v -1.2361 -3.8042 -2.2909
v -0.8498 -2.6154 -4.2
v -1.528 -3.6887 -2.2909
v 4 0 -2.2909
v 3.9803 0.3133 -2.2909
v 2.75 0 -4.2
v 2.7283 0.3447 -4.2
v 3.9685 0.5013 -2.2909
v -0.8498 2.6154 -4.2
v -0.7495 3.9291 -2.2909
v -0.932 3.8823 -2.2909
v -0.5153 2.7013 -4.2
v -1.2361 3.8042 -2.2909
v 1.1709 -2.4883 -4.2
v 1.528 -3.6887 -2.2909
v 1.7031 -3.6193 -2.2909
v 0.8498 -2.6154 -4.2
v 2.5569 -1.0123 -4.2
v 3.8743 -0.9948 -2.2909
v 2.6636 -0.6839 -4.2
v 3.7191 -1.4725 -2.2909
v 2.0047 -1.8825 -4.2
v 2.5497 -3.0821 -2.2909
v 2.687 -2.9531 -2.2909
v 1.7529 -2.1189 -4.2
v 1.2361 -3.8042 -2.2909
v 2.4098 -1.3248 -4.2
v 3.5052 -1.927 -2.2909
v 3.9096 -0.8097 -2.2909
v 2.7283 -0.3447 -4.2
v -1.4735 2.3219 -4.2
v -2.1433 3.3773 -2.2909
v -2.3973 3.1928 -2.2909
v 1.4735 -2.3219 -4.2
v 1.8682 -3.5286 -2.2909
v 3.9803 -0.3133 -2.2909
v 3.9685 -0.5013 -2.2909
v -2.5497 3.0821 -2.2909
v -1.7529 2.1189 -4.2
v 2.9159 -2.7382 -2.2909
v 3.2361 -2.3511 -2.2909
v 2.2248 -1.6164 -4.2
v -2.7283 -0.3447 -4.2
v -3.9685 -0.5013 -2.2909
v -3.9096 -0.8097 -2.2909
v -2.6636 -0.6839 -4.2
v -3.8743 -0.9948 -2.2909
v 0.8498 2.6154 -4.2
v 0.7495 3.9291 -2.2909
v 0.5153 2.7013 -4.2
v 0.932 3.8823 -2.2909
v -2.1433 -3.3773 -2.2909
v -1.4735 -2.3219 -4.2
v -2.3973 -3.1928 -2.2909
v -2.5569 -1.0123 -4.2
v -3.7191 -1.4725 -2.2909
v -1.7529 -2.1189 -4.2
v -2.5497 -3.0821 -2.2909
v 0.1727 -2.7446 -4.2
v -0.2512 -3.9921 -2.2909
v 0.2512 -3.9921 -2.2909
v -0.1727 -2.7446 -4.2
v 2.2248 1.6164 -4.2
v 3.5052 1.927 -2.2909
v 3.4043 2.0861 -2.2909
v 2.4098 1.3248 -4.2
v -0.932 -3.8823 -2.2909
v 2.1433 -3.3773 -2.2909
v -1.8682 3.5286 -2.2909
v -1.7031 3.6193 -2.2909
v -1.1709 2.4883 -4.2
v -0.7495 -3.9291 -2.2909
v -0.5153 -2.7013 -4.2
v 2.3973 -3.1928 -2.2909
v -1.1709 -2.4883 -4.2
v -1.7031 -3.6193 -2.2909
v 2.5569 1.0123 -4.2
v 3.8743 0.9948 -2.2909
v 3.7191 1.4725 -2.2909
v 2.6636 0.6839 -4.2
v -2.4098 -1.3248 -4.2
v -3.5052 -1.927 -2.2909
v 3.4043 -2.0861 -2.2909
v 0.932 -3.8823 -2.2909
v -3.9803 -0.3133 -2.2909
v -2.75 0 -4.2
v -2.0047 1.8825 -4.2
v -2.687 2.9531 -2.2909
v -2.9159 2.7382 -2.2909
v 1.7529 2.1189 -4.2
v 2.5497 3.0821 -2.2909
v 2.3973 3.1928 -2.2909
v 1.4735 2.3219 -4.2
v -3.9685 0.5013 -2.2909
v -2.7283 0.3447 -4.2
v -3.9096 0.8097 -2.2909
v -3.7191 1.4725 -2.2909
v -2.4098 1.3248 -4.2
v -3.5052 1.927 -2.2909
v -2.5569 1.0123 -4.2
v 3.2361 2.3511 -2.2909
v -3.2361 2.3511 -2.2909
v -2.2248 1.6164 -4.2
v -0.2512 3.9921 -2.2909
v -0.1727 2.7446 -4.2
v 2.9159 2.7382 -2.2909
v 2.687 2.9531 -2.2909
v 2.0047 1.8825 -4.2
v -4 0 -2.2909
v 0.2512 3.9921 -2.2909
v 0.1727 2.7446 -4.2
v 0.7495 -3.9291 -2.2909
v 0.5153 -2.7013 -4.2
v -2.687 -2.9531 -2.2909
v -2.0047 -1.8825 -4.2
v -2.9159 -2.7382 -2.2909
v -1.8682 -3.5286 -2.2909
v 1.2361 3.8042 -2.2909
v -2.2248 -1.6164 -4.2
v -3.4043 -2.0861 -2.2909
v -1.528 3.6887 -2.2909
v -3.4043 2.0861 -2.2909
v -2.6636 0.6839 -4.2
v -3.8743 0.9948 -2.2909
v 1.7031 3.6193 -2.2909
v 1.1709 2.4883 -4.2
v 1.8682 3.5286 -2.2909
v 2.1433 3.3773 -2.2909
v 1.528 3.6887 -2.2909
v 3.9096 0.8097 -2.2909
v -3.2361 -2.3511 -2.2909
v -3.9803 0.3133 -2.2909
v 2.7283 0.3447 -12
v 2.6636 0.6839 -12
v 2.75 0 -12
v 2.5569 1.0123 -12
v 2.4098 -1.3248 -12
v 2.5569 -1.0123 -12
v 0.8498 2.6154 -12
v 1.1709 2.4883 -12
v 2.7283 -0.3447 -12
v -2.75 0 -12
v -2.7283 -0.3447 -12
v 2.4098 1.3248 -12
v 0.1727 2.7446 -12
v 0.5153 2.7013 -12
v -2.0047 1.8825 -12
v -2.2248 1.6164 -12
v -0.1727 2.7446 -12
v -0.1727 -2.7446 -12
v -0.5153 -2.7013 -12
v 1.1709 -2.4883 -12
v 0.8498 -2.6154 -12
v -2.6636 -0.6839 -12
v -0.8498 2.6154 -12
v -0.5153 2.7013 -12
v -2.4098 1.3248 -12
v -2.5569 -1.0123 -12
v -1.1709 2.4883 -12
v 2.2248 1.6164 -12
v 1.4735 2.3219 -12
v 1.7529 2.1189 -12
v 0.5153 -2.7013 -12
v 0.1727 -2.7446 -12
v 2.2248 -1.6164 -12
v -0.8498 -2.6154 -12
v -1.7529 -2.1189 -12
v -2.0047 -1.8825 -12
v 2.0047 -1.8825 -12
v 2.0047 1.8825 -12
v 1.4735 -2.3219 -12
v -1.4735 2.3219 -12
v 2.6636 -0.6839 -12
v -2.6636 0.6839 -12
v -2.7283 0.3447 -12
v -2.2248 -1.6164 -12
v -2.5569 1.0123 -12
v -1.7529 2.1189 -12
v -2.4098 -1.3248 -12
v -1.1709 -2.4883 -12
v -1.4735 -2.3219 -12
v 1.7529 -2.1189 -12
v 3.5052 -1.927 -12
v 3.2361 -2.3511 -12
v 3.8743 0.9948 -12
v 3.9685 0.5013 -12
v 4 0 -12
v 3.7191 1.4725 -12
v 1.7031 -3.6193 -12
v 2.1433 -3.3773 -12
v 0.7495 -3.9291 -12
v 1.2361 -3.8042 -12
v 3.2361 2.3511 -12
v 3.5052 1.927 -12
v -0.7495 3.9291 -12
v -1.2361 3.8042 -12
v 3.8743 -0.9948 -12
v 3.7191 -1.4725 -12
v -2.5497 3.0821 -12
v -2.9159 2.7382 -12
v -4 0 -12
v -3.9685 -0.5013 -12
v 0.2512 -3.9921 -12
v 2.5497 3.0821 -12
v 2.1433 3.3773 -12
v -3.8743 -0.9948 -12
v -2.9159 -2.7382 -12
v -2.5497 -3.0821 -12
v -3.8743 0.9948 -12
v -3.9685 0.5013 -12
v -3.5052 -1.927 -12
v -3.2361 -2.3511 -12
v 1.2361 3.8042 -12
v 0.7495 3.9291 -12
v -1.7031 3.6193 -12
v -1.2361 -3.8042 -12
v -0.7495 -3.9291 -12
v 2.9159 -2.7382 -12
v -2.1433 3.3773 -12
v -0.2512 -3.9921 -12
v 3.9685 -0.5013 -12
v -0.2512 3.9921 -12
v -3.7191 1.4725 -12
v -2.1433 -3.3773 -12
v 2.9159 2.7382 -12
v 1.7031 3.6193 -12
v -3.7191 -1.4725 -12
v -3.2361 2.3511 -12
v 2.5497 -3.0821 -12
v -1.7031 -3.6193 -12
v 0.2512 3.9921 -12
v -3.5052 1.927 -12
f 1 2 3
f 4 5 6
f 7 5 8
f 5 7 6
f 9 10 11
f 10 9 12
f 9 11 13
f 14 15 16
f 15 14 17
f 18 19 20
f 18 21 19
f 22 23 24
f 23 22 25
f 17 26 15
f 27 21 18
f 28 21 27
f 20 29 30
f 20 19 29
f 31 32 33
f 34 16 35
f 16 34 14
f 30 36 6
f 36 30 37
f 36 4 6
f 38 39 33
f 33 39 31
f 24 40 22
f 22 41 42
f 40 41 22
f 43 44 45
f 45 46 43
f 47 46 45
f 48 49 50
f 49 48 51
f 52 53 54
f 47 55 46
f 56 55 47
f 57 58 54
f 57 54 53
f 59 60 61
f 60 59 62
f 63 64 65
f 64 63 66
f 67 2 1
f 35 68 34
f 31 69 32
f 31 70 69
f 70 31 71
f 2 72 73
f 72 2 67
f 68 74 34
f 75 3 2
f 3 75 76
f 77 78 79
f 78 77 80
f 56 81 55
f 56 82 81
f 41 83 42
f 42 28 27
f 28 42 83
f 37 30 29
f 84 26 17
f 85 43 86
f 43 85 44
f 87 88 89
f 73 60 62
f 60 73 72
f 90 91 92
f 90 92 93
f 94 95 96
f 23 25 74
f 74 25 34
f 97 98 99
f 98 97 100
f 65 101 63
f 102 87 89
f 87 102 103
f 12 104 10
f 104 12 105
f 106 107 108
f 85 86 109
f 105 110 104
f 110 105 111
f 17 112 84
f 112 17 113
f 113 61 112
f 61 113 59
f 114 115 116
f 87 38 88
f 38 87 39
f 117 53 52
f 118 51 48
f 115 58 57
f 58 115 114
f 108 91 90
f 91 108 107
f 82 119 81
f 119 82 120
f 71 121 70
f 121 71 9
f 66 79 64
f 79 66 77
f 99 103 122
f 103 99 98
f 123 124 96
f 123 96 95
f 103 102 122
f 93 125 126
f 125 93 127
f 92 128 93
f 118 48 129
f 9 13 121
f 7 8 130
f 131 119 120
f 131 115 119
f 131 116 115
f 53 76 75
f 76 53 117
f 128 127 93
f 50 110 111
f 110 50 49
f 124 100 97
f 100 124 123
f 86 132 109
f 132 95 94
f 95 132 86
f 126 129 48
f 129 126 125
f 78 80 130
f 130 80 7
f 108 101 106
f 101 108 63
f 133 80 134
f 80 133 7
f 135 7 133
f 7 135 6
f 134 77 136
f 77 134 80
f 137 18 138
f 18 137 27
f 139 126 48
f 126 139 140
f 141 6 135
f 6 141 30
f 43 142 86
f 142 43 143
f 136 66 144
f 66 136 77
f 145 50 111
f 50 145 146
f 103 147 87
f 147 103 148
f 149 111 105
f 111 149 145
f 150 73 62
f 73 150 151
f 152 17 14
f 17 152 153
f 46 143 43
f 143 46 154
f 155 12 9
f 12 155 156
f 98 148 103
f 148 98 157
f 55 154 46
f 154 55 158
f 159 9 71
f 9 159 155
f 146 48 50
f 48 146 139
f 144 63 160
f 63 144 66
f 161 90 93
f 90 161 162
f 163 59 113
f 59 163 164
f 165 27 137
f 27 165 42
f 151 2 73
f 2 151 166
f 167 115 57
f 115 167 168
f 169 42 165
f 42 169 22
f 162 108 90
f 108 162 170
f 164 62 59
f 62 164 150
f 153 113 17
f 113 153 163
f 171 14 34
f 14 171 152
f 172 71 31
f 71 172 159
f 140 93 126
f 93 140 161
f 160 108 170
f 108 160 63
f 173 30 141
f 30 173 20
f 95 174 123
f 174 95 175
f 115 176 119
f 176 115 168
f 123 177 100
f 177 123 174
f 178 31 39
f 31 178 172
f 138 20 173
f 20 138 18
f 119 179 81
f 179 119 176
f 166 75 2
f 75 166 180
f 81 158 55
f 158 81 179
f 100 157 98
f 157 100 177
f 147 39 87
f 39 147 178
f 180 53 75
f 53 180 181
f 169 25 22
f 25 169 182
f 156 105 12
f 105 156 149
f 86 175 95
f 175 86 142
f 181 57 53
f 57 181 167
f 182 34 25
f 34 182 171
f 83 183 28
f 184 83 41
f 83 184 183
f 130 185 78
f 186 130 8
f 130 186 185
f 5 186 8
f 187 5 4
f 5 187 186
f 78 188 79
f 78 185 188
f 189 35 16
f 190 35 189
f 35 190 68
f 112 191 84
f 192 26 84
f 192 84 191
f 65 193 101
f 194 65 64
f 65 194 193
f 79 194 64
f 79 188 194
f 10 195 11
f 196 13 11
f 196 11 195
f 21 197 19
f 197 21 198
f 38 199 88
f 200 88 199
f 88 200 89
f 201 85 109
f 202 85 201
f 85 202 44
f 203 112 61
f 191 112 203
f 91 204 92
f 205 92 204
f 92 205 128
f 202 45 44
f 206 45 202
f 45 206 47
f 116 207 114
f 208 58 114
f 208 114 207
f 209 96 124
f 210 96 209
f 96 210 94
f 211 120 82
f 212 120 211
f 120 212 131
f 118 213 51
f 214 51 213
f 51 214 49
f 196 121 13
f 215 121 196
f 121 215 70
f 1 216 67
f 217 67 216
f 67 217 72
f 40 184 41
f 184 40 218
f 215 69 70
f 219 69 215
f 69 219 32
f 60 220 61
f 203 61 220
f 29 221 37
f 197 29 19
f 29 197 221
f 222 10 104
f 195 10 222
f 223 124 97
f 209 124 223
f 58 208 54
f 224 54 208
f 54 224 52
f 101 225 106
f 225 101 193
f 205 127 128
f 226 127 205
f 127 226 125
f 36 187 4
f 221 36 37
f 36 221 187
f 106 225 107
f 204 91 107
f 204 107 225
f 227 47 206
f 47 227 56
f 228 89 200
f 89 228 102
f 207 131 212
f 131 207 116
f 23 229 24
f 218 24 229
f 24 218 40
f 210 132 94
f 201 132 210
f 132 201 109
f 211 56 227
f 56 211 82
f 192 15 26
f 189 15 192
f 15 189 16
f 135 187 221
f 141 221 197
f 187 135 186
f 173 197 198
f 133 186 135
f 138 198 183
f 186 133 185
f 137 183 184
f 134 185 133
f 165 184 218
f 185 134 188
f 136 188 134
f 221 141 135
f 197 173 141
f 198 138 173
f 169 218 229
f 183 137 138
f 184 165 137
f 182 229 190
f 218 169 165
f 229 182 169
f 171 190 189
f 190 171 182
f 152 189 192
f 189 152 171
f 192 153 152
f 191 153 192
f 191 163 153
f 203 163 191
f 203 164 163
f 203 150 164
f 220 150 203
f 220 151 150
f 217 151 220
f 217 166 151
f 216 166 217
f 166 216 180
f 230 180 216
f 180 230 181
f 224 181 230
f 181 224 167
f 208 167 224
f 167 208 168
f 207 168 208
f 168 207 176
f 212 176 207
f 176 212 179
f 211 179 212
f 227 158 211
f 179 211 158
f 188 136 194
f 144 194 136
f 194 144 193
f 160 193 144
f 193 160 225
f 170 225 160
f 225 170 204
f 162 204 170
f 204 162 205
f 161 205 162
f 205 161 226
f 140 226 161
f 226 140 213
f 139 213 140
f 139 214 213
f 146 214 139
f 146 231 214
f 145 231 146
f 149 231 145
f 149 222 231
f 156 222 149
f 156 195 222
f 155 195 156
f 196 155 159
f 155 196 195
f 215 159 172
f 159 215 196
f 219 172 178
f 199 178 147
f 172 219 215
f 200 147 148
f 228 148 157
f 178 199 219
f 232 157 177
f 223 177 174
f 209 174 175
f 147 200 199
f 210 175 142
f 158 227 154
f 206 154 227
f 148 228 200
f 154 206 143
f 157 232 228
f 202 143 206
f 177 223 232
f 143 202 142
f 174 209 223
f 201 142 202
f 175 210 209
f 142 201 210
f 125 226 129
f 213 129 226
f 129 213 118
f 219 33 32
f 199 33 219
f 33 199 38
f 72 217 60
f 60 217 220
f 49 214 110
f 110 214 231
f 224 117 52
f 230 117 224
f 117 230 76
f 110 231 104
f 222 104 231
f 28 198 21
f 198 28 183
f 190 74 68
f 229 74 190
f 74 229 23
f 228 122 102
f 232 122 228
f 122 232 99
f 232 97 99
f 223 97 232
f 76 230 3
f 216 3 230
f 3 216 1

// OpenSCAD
$fn = 50;

difference() {
	union() {
		translate(v = [0, 0, -12.0]) {
			cylinder(h = 12, r = 4.0);
		}
	}
	union() {
		translate(v = [0, 0, 0]) {
			rotate(a = [0, 0, 0]) {
				difference() {
					union() {
						translate(v = [0, 0, -15.0]) {
							cylinder(h = 15, r = 2.25);
						}
						translate(v = [0, 0, -4.2]) {
							cylinder(h = 4.2, r1 = 2.75, r2 = 5.5);
						}
						translate(v = [0, 0, -15.0]) {
							cylinder(h = 15, r = 2.75);
						}
						translate(v = [0, 0, -15.0]) {
							cylinder(h = 15, r = 2.25);
						}
					}
					union();
				}
			}
		}
	}
}
